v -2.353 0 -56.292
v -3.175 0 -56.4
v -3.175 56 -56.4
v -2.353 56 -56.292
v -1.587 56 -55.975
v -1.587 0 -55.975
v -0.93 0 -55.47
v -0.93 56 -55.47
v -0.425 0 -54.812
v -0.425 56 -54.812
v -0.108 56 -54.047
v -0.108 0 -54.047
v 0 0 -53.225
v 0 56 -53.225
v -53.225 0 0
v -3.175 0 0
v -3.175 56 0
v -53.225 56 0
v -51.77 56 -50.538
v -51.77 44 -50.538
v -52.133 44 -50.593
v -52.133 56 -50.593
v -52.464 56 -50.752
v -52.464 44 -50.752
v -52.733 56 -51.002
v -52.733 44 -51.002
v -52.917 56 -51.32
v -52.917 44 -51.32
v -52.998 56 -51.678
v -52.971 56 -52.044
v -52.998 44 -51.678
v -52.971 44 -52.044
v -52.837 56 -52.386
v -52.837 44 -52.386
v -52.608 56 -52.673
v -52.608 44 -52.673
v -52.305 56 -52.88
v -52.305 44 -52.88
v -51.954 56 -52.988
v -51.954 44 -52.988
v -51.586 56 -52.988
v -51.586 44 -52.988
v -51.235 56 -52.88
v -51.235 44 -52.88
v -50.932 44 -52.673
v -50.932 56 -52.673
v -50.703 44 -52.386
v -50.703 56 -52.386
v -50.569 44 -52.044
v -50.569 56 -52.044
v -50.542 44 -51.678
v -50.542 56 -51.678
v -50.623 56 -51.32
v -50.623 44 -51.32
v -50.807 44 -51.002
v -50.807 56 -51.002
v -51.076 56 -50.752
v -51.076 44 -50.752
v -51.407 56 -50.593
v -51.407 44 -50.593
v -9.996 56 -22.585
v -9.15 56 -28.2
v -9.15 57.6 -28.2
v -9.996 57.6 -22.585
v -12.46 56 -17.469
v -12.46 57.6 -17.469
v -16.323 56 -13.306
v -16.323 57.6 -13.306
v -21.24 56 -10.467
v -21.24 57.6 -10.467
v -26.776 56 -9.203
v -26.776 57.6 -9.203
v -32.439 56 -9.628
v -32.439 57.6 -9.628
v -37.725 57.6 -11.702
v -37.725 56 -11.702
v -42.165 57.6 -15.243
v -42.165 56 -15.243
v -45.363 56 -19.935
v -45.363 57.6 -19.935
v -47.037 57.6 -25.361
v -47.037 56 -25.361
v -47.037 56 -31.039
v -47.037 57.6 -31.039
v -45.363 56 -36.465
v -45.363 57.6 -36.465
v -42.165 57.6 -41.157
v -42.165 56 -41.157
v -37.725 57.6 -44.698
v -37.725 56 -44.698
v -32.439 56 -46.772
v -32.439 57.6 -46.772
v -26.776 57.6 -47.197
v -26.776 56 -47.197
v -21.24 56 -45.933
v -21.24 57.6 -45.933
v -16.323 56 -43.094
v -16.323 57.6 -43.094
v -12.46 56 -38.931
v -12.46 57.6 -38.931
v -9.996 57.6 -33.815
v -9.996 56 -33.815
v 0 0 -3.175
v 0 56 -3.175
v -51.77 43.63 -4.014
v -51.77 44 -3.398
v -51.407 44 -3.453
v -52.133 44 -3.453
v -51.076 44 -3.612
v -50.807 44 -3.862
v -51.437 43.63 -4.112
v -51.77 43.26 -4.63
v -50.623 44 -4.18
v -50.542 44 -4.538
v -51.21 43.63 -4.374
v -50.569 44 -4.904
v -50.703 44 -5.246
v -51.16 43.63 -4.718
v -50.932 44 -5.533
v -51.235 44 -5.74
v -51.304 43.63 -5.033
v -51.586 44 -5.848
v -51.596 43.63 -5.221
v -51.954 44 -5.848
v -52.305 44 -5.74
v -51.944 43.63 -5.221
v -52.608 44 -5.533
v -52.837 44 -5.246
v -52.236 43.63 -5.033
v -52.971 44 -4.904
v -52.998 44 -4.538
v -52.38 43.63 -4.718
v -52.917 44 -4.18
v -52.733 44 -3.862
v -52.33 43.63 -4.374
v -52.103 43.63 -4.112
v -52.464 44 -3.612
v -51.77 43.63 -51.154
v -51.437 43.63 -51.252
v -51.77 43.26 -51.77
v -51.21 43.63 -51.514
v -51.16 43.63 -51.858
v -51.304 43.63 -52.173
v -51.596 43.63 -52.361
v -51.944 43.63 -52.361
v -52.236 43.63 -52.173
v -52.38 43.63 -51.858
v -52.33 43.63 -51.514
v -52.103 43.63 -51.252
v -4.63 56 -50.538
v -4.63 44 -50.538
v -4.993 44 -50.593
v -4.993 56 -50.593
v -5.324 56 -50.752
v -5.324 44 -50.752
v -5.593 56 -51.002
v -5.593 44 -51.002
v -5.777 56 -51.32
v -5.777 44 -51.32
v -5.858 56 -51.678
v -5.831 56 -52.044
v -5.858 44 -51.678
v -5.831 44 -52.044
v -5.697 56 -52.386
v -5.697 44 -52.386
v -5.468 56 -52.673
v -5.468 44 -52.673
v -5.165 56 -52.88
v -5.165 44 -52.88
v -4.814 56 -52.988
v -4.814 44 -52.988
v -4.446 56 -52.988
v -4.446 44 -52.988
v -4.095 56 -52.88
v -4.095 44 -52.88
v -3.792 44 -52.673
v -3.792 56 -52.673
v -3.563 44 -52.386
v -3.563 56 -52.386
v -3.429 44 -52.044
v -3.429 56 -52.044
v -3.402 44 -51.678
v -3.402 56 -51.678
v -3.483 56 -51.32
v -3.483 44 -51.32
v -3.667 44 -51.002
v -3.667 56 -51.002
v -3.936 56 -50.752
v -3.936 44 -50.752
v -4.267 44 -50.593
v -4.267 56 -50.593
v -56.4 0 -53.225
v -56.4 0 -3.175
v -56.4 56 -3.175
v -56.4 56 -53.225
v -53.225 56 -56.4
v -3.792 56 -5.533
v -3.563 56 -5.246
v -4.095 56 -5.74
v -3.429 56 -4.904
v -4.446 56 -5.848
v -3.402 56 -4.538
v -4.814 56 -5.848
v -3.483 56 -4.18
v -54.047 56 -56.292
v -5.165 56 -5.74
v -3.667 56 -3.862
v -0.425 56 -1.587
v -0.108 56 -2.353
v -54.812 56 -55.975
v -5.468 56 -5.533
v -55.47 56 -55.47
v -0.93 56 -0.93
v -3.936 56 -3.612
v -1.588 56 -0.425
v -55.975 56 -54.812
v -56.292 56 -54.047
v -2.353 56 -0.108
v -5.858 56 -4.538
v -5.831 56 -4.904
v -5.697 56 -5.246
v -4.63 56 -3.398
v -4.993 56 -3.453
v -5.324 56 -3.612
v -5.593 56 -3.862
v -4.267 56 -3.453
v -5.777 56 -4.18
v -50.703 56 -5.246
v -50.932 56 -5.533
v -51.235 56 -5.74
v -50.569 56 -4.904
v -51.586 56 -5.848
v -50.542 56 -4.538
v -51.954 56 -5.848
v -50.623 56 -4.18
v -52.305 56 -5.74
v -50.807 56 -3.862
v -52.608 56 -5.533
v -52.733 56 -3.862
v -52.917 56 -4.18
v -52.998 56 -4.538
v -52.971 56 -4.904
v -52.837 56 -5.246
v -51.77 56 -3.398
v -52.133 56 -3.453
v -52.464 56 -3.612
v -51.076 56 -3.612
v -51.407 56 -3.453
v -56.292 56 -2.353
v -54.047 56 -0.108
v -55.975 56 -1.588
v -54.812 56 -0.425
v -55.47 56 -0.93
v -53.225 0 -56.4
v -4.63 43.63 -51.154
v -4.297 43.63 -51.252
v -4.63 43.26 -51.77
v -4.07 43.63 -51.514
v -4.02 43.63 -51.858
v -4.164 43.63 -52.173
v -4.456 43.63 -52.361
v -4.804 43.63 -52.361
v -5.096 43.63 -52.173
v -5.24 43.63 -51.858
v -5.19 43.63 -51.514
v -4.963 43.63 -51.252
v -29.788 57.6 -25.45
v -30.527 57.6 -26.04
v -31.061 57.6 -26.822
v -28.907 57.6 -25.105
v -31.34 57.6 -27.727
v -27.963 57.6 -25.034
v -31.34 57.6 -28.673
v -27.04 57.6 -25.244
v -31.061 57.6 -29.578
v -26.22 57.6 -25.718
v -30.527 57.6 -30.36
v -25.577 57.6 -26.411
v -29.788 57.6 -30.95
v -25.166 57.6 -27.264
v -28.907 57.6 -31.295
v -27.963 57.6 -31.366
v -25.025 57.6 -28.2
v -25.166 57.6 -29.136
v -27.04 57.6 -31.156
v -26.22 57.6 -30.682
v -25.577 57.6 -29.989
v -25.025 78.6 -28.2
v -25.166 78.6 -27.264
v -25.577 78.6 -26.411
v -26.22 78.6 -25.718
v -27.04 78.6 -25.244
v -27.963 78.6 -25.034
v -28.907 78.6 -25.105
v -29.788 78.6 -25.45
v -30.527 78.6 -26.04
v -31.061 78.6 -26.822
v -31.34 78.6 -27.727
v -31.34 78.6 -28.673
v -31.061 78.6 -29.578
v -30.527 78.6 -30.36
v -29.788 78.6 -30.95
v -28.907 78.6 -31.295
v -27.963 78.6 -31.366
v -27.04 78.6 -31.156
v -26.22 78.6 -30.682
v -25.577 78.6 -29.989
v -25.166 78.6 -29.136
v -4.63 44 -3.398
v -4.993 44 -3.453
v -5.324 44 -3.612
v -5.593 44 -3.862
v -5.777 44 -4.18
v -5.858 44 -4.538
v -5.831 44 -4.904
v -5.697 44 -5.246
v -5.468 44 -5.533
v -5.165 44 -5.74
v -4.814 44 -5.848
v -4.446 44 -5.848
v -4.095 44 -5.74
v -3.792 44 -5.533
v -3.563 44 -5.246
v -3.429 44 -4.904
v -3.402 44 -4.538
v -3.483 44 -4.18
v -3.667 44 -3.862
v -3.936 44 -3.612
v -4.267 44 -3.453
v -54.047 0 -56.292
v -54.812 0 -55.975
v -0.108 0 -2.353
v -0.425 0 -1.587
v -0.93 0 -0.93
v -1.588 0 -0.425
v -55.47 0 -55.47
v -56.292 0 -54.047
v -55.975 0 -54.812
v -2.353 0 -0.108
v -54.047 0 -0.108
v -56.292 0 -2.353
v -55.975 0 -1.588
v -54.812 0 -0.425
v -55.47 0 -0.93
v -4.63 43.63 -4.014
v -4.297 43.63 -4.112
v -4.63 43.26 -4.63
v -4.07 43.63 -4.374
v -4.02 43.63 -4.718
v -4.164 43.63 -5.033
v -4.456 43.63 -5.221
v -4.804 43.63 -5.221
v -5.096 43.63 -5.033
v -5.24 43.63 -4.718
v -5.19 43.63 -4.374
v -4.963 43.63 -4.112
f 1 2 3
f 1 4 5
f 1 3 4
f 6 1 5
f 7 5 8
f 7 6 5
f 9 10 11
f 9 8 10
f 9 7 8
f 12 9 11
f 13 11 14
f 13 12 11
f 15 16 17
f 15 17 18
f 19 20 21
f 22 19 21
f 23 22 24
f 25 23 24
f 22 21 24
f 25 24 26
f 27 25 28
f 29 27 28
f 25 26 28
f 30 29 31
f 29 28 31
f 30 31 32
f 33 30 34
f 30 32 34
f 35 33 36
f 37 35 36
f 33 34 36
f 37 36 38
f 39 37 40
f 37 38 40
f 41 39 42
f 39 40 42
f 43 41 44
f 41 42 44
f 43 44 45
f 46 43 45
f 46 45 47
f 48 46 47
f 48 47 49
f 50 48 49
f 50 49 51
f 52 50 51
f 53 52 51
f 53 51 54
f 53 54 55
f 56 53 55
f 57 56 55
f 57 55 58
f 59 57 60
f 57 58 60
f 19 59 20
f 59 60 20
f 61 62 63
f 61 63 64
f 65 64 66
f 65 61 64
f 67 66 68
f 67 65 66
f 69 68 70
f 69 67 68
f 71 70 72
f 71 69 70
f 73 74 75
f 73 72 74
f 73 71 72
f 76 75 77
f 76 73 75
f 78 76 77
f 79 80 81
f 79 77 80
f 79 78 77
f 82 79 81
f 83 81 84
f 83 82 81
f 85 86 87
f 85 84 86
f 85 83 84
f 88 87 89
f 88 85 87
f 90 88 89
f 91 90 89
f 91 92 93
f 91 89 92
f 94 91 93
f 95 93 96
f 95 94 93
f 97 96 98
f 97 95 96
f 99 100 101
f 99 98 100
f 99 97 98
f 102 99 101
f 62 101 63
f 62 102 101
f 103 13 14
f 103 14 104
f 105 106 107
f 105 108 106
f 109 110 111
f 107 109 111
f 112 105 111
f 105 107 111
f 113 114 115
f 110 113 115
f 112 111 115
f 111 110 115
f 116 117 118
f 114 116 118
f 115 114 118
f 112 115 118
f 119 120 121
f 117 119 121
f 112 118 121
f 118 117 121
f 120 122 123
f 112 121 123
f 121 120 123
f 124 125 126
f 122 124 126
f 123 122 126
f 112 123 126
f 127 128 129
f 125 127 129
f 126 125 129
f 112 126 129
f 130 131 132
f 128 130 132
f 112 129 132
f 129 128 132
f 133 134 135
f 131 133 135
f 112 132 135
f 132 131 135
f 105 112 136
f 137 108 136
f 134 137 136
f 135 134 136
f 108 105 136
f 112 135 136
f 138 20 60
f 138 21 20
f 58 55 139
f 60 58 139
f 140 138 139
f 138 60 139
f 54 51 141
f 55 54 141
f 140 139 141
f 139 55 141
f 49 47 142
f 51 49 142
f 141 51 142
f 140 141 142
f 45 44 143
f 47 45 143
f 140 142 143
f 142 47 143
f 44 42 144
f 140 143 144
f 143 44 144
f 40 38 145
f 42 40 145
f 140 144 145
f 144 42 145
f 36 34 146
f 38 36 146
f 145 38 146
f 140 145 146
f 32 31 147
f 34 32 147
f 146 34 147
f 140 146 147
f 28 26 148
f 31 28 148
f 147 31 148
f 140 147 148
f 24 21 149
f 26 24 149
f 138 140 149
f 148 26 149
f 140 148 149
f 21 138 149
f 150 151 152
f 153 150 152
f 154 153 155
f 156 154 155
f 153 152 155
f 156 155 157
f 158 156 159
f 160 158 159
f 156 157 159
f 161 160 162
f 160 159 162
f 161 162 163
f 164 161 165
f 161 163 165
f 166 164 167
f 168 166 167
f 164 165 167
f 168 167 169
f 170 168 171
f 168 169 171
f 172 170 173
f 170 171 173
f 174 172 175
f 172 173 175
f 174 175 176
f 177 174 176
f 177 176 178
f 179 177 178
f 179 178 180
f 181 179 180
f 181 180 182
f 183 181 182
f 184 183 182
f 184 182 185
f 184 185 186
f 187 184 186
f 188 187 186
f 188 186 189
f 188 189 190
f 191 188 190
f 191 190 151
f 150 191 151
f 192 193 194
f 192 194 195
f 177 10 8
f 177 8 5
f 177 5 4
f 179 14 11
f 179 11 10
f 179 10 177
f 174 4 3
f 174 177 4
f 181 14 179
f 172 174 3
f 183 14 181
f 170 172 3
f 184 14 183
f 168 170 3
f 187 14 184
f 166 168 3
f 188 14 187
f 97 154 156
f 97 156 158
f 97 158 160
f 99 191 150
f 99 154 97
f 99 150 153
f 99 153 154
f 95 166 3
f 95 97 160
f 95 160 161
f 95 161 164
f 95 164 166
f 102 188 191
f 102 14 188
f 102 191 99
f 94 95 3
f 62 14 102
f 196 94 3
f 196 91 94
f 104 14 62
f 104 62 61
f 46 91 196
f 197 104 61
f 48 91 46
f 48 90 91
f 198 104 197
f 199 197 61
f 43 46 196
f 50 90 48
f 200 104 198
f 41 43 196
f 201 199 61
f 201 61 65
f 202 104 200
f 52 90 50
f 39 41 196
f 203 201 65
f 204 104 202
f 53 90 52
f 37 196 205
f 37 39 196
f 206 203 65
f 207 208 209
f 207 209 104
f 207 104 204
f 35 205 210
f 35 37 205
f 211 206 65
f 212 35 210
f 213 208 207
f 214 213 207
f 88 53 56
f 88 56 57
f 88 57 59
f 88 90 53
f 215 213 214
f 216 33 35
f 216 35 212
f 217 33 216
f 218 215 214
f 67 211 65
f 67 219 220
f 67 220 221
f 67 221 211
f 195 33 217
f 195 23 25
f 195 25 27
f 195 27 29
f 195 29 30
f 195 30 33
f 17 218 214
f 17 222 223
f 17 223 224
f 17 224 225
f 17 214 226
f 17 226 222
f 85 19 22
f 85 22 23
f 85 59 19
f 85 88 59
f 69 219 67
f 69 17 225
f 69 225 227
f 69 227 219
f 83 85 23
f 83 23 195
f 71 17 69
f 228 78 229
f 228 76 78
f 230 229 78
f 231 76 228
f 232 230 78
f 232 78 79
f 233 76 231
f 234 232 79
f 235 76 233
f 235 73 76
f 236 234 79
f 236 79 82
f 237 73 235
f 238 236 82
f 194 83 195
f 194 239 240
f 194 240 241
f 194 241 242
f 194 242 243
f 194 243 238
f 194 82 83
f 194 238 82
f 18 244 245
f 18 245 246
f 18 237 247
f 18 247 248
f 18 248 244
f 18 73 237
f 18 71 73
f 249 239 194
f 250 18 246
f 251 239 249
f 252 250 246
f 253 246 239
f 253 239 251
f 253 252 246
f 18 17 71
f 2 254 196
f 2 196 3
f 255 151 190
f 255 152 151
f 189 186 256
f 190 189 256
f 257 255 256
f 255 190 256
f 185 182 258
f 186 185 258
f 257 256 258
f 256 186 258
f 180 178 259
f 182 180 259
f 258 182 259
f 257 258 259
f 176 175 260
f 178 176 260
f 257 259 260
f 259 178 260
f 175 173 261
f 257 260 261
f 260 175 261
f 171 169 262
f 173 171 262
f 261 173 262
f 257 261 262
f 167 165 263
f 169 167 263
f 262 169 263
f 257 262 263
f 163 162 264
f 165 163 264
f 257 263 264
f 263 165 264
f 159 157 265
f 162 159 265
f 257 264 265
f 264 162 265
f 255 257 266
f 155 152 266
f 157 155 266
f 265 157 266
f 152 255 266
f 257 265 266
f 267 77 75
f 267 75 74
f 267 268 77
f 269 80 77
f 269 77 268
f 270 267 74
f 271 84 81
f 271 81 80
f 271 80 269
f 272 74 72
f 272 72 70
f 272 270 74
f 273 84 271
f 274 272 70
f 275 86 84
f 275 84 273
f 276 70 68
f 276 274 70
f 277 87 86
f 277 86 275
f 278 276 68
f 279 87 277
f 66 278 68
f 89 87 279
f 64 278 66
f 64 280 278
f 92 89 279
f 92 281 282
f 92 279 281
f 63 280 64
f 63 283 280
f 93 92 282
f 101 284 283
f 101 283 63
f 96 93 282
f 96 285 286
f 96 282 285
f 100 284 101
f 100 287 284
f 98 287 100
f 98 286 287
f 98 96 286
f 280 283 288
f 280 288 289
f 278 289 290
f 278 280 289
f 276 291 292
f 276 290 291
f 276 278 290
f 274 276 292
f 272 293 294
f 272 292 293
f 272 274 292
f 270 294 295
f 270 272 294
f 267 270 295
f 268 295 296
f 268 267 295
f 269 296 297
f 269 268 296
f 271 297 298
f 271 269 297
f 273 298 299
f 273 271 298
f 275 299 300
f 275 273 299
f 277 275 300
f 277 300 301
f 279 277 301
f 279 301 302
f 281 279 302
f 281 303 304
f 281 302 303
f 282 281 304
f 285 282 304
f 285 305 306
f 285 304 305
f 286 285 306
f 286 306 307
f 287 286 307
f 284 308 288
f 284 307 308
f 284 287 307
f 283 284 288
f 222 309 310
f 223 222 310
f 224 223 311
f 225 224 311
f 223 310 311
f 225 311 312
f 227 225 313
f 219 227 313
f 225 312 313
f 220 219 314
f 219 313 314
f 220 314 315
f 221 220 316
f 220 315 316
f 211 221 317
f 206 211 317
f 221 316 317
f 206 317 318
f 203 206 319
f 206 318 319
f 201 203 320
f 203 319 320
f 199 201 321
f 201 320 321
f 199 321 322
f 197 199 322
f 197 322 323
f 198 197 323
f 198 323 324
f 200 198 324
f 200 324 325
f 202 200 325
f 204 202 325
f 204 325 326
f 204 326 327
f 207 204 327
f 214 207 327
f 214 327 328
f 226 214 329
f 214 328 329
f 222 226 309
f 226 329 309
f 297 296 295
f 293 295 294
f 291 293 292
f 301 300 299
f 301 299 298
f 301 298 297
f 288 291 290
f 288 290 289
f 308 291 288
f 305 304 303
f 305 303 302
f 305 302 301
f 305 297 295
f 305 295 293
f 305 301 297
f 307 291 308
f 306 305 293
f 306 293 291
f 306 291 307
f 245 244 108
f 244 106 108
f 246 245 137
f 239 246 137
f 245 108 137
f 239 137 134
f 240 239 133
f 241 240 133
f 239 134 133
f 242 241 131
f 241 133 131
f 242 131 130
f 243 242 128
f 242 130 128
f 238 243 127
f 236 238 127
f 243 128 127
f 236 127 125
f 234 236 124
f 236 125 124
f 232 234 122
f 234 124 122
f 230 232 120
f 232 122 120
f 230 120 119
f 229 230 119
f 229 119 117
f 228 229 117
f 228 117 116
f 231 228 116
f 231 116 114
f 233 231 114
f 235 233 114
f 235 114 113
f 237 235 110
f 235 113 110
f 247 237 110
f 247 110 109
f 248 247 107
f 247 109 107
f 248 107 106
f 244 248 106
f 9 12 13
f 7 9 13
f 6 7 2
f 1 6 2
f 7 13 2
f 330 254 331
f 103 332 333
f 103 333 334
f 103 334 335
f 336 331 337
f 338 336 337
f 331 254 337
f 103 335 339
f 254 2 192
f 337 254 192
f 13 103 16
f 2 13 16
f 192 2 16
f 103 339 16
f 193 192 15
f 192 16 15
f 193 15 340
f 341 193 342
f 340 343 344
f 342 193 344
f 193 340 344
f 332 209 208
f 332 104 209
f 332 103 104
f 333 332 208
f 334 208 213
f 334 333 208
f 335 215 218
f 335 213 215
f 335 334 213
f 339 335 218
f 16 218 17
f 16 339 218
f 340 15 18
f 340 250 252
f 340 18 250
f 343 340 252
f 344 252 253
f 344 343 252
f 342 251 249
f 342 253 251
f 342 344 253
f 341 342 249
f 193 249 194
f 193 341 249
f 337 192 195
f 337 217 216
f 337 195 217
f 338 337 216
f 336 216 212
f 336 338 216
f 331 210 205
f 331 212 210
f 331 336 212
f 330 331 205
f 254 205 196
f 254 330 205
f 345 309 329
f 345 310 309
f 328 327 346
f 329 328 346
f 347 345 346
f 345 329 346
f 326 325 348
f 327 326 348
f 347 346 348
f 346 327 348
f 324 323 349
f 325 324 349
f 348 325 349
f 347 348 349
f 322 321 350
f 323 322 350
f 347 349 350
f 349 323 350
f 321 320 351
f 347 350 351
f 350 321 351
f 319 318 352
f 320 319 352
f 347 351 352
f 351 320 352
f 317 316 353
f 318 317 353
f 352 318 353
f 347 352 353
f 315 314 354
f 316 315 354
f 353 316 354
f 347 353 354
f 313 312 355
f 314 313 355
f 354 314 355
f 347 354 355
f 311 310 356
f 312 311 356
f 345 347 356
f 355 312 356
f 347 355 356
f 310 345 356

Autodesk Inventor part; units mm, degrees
ref_plane "YZ Plane" through (0, 0, 0) normal (1, 0, 0) x (0, 1, 0)
ref_plane "XZ Plane" through (0, 0, 0) normal (0, 1, 0) x (-1, 0, 0)
ref_plane "XY Plane" through (0, 0, 0) normal (0, 0, 1) x (1, 0, 0)
sketch "Sketch1" plane through (0, 0, 0) normal (0, 1, 0) x (-1, 0, 0)
  line L0 (3.175, 0) -> (53.225, 0)
  line L1 (56.4, -3.175) -> (56.4, -53.225)
  line L2 (53.225, -56.4) -> (3.175, -56.4)
  line L3 (0, -53.225) -> (0, -3.175)
  arc A0 (56.4, -3.175) -> (53.225, 0) centre (53.225, -3.175) ccw
  arc A1 (3.175, 0) -> (0, -3.175) centre (3.175, -3.175) ccw
  arc A2 (0, -53.225) -> (3.175, -56.4) centre (3.175, -53.225) ccw
  arc A3 (53.225, -56.4) -> (56.4, -53.225) centre (53.225, -53.225) ccw
  point P0 (0, 0)
  point P1 (56.4, -56.4)
  point P2 (56.4, 0)
  point P3 (0, -56.4)
  dimension "d0" = 56.4
  dimension "d1" = 56.4
  dimension "d2" = 3.175
extrude "Extrusion1" add sketch "Sketch1" along normal blind 56
sketch "Sketch2" plane through (0, 56, 0) normal (0, 1, 0) x (1, 0, 0)
  line L0 (0, 0) -> (-56.4, 0) construction
  line L1 (-56.4, 0) -> (-56.4, 56.4) construction
  line L2 (-56.4, 56.4) -> (0, 56.4) construction
  line L3 (0, 56.4) -> (0, 0) construction
  line L4 (-56.4, 0) -> (0, 56.4) construction
  line L5 (-4.63, 4.63) -> (-51.77, 4.63) construction
  line L6 (-51.77, 4.63) -> (-51.77, 51.77) construction
  line L7 (-51.77, 51.77) -> (-4.63, 51.77) construction
  line L8 (-4.63, 51.77) -> (-4.63, 4.63) construction
  line L9 (-4.63, 4.63) -> (-51.77, 51.77) construction
  line L10 (-51.77, 4.63) -> (-4.63, 51.77) construction
  circle A0 centre (-51.8006, 4.5994) radius 2.5
  circle A1 centre (-51.77, 51.77) radius 2.5
  circle A2 centre (-4.63, 51.77) radius 2.5
  circle A3 centre (-4.63, 4.63) radius 2.5
  point P0 (-28.2, 28.2)
  dimension "d5" = 47.14
  dimension "d6" = 47.14
  dimension "d7" = 5
  dimension "d8" = 5
  dimension "d9" = 5
  dimension "d10" = 5
hole "Hole1" at (-51.77, 56, -51.77) at (-4.63, 56, -51.77) at (-51.77, 56, -4.63) at (-4.63, 56, -4.63) direction (0, -1, 0) diameter 2.4638 depth 12 tip angle 118
sketch "Sketch3" plane through (0, 56, 0) normal (0, 1, 0) x (1, 0, 0)
  line L0 (0, 0) -> (-56.4, 56.4) construction
  circle A0 centre (-28.2, 28.2) radius 19.05
  dimension "d18" = 38.1
extrude "Extrusion2" add sketch "Sketch3" along normal blind 1.6
sketch "Sketch4" plane through (-28.2, 57.6, -28.2) normal (0, 1, 0) x (1, 0, 0)
  circle A0 centre (0, 0) radius 3.175
  point P0 (28.2, -28.2)
  dimension "d21" = 6.35
extrude "Extrusion3" add sketch "Sketch4" along normal blind 21
properties part number "NEMA23 Motor"
